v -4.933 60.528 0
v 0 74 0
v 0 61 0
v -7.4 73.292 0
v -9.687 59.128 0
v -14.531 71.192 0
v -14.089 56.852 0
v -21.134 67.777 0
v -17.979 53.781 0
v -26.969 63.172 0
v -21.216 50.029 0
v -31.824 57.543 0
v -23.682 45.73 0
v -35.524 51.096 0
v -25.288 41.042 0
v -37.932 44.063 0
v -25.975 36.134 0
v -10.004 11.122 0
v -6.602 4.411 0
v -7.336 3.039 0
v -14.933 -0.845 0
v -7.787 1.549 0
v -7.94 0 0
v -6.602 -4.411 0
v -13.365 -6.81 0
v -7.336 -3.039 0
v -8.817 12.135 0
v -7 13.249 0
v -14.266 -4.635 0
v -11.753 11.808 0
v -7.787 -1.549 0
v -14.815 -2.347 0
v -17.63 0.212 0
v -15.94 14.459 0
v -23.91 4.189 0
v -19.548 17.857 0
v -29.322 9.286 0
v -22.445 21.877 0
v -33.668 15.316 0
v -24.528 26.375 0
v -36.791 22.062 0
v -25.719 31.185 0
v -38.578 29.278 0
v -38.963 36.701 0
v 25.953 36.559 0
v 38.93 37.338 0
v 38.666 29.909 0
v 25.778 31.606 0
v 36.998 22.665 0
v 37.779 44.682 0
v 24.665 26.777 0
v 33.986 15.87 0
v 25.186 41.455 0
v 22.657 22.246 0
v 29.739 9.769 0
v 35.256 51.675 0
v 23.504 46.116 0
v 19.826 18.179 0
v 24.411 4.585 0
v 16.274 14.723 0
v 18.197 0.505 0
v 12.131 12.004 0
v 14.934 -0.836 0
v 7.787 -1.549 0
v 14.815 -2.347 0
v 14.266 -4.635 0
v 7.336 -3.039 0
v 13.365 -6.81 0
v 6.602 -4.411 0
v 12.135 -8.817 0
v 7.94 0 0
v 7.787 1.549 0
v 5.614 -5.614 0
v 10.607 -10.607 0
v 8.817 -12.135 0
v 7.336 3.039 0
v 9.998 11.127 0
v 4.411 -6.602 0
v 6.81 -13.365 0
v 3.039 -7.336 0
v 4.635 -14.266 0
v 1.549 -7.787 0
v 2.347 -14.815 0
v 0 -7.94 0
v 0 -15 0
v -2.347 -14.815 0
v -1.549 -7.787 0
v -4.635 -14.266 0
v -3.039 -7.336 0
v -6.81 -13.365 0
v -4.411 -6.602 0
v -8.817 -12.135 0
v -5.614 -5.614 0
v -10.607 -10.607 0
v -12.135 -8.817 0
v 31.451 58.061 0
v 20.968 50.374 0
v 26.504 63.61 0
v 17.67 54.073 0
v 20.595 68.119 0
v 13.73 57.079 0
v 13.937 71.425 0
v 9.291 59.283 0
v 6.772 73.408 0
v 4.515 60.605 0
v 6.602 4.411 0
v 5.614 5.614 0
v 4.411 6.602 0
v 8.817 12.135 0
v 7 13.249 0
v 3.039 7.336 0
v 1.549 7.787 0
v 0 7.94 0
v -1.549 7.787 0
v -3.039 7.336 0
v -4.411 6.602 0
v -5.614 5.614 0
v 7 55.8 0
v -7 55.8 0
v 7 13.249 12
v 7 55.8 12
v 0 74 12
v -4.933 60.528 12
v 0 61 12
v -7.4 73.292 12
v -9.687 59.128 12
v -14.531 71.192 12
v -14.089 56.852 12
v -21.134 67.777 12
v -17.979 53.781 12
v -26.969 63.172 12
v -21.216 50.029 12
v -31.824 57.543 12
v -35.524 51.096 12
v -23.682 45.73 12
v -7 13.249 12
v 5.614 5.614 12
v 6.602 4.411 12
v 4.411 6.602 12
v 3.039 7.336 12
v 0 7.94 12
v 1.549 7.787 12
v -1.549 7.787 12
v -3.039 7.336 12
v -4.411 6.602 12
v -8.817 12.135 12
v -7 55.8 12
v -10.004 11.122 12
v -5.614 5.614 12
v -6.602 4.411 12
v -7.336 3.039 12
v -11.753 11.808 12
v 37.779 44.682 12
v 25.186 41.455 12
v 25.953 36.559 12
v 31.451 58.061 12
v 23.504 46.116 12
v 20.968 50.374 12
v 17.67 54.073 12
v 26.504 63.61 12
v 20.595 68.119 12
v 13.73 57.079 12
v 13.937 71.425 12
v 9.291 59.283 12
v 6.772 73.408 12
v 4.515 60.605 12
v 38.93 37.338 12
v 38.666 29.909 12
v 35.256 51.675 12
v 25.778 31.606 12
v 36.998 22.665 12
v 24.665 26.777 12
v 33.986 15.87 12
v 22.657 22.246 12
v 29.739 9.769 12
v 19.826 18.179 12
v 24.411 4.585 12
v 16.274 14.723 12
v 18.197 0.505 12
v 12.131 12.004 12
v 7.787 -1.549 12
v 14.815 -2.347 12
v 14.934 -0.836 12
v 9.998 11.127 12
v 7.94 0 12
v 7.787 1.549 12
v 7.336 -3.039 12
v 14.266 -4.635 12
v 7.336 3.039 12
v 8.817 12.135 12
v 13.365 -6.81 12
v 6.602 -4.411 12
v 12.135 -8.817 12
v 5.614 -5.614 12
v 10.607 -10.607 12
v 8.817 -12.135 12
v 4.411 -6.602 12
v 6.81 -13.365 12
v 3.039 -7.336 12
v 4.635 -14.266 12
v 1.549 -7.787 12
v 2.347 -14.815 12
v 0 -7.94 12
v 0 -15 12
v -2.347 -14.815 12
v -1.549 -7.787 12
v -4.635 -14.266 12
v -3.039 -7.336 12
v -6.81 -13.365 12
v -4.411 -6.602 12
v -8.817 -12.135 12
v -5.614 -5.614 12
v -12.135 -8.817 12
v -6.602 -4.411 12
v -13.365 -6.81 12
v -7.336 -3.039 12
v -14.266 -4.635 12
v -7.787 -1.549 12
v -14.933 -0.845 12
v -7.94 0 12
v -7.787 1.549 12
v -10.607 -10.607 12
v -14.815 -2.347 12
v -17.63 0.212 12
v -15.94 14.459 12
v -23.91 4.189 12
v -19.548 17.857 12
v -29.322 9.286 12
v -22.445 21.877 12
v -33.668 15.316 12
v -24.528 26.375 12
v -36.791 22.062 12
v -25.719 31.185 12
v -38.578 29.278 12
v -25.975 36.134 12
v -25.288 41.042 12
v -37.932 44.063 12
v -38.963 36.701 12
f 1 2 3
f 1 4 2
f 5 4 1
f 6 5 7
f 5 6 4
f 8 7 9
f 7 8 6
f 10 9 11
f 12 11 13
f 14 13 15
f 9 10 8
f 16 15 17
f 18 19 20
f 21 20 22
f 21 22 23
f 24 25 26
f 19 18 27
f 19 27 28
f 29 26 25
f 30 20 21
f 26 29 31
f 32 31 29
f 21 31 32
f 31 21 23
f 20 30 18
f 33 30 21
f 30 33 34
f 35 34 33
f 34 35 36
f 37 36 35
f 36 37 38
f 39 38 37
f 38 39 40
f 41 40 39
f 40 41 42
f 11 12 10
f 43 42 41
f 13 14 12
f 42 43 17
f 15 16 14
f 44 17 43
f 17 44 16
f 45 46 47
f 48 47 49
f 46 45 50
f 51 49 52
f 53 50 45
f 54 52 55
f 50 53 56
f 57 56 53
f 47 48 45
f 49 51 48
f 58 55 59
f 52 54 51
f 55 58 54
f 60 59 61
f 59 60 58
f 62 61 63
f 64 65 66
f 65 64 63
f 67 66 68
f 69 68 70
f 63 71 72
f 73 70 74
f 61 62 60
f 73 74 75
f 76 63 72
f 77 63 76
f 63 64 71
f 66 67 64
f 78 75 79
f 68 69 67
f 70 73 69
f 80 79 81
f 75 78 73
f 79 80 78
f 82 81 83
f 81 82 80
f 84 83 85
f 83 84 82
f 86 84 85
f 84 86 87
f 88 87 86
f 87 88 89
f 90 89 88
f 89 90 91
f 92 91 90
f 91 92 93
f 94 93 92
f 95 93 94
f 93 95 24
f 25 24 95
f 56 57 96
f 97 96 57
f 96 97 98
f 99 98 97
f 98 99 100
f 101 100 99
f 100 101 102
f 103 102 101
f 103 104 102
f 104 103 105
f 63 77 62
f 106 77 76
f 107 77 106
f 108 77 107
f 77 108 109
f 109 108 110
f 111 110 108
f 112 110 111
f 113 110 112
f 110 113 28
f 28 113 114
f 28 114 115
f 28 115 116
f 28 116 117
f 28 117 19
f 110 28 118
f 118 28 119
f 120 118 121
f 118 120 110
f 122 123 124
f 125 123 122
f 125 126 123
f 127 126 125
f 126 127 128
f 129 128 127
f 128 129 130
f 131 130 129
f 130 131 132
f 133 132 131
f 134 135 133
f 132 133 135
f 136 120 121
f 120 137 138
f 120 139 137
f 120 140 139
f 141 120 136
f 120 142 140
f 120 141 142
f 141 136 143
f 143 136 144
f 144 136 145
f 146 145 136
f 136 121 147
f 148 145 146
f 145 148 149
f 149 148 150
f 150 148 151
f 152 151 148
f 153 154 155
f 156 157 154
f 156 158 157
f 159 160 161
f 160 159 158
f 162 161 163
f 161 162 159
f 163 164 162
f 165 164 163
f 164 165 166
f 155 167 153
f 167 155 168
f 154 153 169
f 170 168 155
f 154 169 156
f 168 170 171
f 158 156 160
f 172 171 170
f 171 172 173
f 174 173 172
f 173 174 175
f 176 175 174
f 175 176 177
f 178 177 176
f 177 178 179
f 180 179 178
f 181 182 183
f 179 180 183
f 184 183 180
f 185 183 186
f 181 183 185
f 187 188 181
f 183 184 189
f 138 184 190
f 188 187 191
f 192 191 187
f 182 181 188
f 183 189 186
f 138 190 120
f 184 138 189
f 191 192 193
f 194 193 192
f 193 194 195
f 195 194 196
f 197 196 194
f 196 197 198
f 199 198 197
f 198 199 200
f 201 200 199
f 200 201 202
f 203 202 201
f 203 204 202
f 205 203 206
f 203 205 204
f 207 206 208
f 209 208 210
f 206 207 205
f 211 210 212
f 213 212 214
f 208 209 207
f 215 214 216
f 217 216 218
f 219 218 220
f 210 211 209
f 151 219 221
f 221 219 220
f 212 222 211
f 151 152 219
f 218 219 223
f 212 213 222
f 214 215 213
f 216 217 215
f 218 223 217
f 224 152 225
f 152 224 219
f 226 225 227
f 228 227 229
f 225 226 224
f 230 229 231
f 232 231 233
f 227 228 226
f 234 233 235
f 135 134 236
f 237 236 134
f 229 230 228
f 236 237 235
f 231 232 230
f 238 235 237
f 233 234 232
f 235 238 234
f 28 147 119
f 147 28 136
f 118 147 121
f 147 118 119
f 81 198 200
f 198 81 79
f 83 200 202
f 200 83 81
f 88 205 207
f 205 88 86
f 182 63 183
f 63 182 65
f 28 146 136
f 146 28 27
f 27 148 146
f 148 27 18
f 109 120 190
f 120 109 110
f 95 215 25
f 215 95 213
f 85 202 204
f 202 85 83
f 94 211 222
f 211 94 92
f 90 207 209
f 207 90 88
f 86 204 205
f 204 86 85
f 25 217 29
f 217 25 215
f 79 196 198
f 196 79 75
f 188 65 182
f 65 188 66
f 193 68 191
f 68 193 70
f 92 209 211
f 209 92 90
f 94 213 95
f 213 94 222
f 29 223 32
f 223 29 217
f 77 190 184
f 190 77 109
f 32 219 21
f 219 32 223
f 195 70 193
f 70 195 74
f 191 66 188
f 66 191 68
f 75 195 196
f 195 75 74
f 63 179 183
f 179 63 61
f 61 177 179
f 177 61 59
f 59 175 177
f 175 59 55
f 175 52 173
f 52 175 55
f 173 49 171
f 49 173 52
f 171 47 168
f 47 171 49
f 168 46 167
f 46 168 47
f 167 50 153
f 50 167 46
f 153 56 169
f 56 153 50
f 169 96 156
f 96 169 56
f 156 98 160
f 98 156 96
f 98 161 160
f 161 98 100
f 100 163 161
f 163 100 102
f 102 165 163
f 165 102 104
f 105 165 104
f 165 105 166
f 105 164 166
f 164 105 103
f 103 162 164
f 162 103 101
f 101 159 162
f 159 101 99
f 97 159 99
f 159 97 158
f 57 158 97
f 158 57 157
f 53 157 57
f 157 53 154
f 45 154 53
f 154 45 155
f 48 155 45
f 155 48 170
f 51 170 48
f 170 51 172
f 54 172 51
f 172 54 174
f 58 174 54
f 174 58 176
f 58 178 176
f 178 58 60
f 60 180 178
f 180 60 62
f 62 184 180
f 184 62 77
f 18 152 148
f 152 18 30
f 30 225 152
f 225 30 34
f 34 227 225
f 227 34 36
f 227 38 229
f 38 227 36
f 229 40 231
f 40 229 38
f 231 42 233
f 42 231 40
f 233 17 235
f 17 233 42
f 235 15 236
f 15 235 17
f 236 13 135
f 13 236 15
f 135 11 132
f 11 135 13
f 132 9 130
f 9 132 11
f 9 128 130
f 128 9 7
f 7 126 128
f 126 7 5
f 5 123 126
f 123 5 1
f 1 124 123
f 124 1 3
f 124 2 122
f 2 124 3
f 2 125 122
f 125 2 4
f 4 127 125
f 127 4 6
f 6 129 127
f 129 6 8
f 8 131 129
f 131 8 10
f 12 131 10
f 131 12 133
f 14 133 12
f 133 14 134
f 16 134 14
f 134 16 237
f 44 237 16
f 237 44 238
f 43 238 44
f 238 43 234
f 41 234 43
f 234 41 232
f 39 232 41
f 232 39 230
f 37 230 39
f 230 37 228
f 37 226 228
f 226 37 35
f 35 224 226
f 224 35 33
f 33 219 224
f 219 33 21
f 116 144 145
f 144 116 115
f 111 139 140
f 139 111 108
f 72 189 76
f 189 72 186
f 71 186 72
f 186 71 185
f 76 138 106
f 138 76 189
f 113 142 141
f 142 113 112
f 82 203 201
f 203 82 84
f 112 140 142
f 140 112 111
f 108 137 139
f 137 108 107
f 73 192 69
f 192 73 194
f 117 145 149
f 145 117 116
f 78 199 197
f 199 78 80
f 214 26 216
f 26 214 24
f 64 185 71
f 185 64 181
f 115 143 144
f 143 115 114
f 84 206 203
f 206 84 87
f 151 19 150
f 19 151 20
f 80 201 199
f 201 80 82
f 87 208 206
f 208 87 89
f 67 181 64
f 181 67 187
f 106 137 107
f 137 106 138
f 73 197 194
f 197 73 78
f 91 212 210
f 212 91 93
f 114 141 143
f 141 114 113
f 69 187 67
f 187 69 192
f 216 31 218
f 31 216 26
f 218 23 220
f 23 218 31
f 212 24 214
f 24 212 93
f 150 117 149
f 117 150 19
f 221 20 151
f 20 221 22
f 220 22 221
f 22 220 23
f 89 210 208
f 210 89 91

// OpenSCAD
$fn = 32;

// ----------------------------------------------------------------------
// Hook: 70 mm shank into a 26 mm curl, 12 mm thick
// ----------------------------------------------------------------------

// --- parameters (mm) ---
shank_len = 70;           // shank length from the boss centre
shank_w = 14;             // shank width
boss_d = 30;              // boss diameter
bore_d = 15.88;           // boss bore
curl_in = 26;             // curl inner radius
curl_out = 39;            // curl outer radius
curl_sweep = 350;         // curl sweep angle
hook_t = 12;              // hook thickness

shank_profile = [[-7, 55.8], [7, 55.8], [7, 13], [-7, 13]];
boss_profile = [[15, 0], [14.815, 2.347], [14.266, 4.635], [13.365, 6.81], [12.135, 8.817], [10.607, 10.607], [8.817, 12.135], [6.81, 13.365], [4.635, 14.266], [2.347, 14.815], [0, 15], [-2.347, 14.815], [-4.635, 14.266], [-6.81, 13.365], [-8.817, 12.135], [-10.607, 10.607], [-12.135, 8.817], [-13.365, 6.81], [-14.266, 4.635], [-14.815, 2.347], [-15, 0], [-14.815, -2.347], [-14.266, -4.635], [-13.365, -6.81], [-12.135, -8.817], [-10.607, -10.607], [-8.817, -12.135], [-6.81, -13.365], [-4.635, -14.266], [-2.347, -14.815], [0, -15], [2.347, -14.815], [4.635, -14.266], [6.81, -13.365], [8.817, -12.135], [10.607, -10.607], [12.135, -8.817], [13.365, -6.81], [14.266, -4.635], [14.815, -2.347]];
curl_profile = [[0, 74], [-7.4, 73.292], [-14.531, 71.192], [-21.134, 67.777], [-26.969, 63.172], [-31.824, 57.543], [-35.524, 51.096], [-37.932, 44.063], [-38.963, 36.701], [-38.578, 29.278], [-36.791, 22.062], [-33.668, 15.316], [-29.322, 9.286], [-23.91, 4.189], [-17.63, 0.212], [-10.709, -2.501], [-3.399, -3.852], [4.034, -3.791], [11.321, -2.321], [18.197, 0.505], [24.411, 4.585], [29.739, 9.769], [33.986, 15.87], [36.998, 22.665], [38.666, 29.909], [38.93, 37.338], [37.779, 44.682], [35.256, 51.675], [31.451, 58.061], [26.504, 63.61], [20.595, 68.119], [13.937, 71.425], [6.772, 73.408], [4.515, 60.605], [9.291, 59.283], [13.73, 57.079], [17.67, 54.073], [20.968, 50.374], [23.504, 46.116], [25.186, 41.455], [25.953, 36.559], [25.778, 31.606], [24.665, 26.777], [22.657, 22.246], [19.826, 18.179], [16.274, 14.723], [12.131, 12.004], [7.547, 10.12], [2.69, 9.139], [-2.266, 9.099], [-7.139, 9.999], [-11.753, 11.808], [-15.94, 14.459], [-19.548, 17.857], [-22.445, 21.877], [-24.528, 26.375], [-25.719, 31.185], [-25.975, 36.134], [-25.288, 41.042], [-23.682, 45.73], [-21.216, 50.029], [-17.979, 53.781], [-14.089, 56.852], [-9.687, 59.128], [-4.933, 60.528], [0, 61]];

difference() {
  union() {
    /* three overlapping outlines: shank, boss and the smooth curl */
    linear_extrude(height = hook_t) polygon(shank_profile);
    linear_extrude(height = hook_t) polygon(boss_profile);
    linear_extrude(height = hook_t) polygon(curl_profile);
  }
  translate([0, 0, -2.5]) cylinder(h = hook_t + 5, d = bore_d);
}
